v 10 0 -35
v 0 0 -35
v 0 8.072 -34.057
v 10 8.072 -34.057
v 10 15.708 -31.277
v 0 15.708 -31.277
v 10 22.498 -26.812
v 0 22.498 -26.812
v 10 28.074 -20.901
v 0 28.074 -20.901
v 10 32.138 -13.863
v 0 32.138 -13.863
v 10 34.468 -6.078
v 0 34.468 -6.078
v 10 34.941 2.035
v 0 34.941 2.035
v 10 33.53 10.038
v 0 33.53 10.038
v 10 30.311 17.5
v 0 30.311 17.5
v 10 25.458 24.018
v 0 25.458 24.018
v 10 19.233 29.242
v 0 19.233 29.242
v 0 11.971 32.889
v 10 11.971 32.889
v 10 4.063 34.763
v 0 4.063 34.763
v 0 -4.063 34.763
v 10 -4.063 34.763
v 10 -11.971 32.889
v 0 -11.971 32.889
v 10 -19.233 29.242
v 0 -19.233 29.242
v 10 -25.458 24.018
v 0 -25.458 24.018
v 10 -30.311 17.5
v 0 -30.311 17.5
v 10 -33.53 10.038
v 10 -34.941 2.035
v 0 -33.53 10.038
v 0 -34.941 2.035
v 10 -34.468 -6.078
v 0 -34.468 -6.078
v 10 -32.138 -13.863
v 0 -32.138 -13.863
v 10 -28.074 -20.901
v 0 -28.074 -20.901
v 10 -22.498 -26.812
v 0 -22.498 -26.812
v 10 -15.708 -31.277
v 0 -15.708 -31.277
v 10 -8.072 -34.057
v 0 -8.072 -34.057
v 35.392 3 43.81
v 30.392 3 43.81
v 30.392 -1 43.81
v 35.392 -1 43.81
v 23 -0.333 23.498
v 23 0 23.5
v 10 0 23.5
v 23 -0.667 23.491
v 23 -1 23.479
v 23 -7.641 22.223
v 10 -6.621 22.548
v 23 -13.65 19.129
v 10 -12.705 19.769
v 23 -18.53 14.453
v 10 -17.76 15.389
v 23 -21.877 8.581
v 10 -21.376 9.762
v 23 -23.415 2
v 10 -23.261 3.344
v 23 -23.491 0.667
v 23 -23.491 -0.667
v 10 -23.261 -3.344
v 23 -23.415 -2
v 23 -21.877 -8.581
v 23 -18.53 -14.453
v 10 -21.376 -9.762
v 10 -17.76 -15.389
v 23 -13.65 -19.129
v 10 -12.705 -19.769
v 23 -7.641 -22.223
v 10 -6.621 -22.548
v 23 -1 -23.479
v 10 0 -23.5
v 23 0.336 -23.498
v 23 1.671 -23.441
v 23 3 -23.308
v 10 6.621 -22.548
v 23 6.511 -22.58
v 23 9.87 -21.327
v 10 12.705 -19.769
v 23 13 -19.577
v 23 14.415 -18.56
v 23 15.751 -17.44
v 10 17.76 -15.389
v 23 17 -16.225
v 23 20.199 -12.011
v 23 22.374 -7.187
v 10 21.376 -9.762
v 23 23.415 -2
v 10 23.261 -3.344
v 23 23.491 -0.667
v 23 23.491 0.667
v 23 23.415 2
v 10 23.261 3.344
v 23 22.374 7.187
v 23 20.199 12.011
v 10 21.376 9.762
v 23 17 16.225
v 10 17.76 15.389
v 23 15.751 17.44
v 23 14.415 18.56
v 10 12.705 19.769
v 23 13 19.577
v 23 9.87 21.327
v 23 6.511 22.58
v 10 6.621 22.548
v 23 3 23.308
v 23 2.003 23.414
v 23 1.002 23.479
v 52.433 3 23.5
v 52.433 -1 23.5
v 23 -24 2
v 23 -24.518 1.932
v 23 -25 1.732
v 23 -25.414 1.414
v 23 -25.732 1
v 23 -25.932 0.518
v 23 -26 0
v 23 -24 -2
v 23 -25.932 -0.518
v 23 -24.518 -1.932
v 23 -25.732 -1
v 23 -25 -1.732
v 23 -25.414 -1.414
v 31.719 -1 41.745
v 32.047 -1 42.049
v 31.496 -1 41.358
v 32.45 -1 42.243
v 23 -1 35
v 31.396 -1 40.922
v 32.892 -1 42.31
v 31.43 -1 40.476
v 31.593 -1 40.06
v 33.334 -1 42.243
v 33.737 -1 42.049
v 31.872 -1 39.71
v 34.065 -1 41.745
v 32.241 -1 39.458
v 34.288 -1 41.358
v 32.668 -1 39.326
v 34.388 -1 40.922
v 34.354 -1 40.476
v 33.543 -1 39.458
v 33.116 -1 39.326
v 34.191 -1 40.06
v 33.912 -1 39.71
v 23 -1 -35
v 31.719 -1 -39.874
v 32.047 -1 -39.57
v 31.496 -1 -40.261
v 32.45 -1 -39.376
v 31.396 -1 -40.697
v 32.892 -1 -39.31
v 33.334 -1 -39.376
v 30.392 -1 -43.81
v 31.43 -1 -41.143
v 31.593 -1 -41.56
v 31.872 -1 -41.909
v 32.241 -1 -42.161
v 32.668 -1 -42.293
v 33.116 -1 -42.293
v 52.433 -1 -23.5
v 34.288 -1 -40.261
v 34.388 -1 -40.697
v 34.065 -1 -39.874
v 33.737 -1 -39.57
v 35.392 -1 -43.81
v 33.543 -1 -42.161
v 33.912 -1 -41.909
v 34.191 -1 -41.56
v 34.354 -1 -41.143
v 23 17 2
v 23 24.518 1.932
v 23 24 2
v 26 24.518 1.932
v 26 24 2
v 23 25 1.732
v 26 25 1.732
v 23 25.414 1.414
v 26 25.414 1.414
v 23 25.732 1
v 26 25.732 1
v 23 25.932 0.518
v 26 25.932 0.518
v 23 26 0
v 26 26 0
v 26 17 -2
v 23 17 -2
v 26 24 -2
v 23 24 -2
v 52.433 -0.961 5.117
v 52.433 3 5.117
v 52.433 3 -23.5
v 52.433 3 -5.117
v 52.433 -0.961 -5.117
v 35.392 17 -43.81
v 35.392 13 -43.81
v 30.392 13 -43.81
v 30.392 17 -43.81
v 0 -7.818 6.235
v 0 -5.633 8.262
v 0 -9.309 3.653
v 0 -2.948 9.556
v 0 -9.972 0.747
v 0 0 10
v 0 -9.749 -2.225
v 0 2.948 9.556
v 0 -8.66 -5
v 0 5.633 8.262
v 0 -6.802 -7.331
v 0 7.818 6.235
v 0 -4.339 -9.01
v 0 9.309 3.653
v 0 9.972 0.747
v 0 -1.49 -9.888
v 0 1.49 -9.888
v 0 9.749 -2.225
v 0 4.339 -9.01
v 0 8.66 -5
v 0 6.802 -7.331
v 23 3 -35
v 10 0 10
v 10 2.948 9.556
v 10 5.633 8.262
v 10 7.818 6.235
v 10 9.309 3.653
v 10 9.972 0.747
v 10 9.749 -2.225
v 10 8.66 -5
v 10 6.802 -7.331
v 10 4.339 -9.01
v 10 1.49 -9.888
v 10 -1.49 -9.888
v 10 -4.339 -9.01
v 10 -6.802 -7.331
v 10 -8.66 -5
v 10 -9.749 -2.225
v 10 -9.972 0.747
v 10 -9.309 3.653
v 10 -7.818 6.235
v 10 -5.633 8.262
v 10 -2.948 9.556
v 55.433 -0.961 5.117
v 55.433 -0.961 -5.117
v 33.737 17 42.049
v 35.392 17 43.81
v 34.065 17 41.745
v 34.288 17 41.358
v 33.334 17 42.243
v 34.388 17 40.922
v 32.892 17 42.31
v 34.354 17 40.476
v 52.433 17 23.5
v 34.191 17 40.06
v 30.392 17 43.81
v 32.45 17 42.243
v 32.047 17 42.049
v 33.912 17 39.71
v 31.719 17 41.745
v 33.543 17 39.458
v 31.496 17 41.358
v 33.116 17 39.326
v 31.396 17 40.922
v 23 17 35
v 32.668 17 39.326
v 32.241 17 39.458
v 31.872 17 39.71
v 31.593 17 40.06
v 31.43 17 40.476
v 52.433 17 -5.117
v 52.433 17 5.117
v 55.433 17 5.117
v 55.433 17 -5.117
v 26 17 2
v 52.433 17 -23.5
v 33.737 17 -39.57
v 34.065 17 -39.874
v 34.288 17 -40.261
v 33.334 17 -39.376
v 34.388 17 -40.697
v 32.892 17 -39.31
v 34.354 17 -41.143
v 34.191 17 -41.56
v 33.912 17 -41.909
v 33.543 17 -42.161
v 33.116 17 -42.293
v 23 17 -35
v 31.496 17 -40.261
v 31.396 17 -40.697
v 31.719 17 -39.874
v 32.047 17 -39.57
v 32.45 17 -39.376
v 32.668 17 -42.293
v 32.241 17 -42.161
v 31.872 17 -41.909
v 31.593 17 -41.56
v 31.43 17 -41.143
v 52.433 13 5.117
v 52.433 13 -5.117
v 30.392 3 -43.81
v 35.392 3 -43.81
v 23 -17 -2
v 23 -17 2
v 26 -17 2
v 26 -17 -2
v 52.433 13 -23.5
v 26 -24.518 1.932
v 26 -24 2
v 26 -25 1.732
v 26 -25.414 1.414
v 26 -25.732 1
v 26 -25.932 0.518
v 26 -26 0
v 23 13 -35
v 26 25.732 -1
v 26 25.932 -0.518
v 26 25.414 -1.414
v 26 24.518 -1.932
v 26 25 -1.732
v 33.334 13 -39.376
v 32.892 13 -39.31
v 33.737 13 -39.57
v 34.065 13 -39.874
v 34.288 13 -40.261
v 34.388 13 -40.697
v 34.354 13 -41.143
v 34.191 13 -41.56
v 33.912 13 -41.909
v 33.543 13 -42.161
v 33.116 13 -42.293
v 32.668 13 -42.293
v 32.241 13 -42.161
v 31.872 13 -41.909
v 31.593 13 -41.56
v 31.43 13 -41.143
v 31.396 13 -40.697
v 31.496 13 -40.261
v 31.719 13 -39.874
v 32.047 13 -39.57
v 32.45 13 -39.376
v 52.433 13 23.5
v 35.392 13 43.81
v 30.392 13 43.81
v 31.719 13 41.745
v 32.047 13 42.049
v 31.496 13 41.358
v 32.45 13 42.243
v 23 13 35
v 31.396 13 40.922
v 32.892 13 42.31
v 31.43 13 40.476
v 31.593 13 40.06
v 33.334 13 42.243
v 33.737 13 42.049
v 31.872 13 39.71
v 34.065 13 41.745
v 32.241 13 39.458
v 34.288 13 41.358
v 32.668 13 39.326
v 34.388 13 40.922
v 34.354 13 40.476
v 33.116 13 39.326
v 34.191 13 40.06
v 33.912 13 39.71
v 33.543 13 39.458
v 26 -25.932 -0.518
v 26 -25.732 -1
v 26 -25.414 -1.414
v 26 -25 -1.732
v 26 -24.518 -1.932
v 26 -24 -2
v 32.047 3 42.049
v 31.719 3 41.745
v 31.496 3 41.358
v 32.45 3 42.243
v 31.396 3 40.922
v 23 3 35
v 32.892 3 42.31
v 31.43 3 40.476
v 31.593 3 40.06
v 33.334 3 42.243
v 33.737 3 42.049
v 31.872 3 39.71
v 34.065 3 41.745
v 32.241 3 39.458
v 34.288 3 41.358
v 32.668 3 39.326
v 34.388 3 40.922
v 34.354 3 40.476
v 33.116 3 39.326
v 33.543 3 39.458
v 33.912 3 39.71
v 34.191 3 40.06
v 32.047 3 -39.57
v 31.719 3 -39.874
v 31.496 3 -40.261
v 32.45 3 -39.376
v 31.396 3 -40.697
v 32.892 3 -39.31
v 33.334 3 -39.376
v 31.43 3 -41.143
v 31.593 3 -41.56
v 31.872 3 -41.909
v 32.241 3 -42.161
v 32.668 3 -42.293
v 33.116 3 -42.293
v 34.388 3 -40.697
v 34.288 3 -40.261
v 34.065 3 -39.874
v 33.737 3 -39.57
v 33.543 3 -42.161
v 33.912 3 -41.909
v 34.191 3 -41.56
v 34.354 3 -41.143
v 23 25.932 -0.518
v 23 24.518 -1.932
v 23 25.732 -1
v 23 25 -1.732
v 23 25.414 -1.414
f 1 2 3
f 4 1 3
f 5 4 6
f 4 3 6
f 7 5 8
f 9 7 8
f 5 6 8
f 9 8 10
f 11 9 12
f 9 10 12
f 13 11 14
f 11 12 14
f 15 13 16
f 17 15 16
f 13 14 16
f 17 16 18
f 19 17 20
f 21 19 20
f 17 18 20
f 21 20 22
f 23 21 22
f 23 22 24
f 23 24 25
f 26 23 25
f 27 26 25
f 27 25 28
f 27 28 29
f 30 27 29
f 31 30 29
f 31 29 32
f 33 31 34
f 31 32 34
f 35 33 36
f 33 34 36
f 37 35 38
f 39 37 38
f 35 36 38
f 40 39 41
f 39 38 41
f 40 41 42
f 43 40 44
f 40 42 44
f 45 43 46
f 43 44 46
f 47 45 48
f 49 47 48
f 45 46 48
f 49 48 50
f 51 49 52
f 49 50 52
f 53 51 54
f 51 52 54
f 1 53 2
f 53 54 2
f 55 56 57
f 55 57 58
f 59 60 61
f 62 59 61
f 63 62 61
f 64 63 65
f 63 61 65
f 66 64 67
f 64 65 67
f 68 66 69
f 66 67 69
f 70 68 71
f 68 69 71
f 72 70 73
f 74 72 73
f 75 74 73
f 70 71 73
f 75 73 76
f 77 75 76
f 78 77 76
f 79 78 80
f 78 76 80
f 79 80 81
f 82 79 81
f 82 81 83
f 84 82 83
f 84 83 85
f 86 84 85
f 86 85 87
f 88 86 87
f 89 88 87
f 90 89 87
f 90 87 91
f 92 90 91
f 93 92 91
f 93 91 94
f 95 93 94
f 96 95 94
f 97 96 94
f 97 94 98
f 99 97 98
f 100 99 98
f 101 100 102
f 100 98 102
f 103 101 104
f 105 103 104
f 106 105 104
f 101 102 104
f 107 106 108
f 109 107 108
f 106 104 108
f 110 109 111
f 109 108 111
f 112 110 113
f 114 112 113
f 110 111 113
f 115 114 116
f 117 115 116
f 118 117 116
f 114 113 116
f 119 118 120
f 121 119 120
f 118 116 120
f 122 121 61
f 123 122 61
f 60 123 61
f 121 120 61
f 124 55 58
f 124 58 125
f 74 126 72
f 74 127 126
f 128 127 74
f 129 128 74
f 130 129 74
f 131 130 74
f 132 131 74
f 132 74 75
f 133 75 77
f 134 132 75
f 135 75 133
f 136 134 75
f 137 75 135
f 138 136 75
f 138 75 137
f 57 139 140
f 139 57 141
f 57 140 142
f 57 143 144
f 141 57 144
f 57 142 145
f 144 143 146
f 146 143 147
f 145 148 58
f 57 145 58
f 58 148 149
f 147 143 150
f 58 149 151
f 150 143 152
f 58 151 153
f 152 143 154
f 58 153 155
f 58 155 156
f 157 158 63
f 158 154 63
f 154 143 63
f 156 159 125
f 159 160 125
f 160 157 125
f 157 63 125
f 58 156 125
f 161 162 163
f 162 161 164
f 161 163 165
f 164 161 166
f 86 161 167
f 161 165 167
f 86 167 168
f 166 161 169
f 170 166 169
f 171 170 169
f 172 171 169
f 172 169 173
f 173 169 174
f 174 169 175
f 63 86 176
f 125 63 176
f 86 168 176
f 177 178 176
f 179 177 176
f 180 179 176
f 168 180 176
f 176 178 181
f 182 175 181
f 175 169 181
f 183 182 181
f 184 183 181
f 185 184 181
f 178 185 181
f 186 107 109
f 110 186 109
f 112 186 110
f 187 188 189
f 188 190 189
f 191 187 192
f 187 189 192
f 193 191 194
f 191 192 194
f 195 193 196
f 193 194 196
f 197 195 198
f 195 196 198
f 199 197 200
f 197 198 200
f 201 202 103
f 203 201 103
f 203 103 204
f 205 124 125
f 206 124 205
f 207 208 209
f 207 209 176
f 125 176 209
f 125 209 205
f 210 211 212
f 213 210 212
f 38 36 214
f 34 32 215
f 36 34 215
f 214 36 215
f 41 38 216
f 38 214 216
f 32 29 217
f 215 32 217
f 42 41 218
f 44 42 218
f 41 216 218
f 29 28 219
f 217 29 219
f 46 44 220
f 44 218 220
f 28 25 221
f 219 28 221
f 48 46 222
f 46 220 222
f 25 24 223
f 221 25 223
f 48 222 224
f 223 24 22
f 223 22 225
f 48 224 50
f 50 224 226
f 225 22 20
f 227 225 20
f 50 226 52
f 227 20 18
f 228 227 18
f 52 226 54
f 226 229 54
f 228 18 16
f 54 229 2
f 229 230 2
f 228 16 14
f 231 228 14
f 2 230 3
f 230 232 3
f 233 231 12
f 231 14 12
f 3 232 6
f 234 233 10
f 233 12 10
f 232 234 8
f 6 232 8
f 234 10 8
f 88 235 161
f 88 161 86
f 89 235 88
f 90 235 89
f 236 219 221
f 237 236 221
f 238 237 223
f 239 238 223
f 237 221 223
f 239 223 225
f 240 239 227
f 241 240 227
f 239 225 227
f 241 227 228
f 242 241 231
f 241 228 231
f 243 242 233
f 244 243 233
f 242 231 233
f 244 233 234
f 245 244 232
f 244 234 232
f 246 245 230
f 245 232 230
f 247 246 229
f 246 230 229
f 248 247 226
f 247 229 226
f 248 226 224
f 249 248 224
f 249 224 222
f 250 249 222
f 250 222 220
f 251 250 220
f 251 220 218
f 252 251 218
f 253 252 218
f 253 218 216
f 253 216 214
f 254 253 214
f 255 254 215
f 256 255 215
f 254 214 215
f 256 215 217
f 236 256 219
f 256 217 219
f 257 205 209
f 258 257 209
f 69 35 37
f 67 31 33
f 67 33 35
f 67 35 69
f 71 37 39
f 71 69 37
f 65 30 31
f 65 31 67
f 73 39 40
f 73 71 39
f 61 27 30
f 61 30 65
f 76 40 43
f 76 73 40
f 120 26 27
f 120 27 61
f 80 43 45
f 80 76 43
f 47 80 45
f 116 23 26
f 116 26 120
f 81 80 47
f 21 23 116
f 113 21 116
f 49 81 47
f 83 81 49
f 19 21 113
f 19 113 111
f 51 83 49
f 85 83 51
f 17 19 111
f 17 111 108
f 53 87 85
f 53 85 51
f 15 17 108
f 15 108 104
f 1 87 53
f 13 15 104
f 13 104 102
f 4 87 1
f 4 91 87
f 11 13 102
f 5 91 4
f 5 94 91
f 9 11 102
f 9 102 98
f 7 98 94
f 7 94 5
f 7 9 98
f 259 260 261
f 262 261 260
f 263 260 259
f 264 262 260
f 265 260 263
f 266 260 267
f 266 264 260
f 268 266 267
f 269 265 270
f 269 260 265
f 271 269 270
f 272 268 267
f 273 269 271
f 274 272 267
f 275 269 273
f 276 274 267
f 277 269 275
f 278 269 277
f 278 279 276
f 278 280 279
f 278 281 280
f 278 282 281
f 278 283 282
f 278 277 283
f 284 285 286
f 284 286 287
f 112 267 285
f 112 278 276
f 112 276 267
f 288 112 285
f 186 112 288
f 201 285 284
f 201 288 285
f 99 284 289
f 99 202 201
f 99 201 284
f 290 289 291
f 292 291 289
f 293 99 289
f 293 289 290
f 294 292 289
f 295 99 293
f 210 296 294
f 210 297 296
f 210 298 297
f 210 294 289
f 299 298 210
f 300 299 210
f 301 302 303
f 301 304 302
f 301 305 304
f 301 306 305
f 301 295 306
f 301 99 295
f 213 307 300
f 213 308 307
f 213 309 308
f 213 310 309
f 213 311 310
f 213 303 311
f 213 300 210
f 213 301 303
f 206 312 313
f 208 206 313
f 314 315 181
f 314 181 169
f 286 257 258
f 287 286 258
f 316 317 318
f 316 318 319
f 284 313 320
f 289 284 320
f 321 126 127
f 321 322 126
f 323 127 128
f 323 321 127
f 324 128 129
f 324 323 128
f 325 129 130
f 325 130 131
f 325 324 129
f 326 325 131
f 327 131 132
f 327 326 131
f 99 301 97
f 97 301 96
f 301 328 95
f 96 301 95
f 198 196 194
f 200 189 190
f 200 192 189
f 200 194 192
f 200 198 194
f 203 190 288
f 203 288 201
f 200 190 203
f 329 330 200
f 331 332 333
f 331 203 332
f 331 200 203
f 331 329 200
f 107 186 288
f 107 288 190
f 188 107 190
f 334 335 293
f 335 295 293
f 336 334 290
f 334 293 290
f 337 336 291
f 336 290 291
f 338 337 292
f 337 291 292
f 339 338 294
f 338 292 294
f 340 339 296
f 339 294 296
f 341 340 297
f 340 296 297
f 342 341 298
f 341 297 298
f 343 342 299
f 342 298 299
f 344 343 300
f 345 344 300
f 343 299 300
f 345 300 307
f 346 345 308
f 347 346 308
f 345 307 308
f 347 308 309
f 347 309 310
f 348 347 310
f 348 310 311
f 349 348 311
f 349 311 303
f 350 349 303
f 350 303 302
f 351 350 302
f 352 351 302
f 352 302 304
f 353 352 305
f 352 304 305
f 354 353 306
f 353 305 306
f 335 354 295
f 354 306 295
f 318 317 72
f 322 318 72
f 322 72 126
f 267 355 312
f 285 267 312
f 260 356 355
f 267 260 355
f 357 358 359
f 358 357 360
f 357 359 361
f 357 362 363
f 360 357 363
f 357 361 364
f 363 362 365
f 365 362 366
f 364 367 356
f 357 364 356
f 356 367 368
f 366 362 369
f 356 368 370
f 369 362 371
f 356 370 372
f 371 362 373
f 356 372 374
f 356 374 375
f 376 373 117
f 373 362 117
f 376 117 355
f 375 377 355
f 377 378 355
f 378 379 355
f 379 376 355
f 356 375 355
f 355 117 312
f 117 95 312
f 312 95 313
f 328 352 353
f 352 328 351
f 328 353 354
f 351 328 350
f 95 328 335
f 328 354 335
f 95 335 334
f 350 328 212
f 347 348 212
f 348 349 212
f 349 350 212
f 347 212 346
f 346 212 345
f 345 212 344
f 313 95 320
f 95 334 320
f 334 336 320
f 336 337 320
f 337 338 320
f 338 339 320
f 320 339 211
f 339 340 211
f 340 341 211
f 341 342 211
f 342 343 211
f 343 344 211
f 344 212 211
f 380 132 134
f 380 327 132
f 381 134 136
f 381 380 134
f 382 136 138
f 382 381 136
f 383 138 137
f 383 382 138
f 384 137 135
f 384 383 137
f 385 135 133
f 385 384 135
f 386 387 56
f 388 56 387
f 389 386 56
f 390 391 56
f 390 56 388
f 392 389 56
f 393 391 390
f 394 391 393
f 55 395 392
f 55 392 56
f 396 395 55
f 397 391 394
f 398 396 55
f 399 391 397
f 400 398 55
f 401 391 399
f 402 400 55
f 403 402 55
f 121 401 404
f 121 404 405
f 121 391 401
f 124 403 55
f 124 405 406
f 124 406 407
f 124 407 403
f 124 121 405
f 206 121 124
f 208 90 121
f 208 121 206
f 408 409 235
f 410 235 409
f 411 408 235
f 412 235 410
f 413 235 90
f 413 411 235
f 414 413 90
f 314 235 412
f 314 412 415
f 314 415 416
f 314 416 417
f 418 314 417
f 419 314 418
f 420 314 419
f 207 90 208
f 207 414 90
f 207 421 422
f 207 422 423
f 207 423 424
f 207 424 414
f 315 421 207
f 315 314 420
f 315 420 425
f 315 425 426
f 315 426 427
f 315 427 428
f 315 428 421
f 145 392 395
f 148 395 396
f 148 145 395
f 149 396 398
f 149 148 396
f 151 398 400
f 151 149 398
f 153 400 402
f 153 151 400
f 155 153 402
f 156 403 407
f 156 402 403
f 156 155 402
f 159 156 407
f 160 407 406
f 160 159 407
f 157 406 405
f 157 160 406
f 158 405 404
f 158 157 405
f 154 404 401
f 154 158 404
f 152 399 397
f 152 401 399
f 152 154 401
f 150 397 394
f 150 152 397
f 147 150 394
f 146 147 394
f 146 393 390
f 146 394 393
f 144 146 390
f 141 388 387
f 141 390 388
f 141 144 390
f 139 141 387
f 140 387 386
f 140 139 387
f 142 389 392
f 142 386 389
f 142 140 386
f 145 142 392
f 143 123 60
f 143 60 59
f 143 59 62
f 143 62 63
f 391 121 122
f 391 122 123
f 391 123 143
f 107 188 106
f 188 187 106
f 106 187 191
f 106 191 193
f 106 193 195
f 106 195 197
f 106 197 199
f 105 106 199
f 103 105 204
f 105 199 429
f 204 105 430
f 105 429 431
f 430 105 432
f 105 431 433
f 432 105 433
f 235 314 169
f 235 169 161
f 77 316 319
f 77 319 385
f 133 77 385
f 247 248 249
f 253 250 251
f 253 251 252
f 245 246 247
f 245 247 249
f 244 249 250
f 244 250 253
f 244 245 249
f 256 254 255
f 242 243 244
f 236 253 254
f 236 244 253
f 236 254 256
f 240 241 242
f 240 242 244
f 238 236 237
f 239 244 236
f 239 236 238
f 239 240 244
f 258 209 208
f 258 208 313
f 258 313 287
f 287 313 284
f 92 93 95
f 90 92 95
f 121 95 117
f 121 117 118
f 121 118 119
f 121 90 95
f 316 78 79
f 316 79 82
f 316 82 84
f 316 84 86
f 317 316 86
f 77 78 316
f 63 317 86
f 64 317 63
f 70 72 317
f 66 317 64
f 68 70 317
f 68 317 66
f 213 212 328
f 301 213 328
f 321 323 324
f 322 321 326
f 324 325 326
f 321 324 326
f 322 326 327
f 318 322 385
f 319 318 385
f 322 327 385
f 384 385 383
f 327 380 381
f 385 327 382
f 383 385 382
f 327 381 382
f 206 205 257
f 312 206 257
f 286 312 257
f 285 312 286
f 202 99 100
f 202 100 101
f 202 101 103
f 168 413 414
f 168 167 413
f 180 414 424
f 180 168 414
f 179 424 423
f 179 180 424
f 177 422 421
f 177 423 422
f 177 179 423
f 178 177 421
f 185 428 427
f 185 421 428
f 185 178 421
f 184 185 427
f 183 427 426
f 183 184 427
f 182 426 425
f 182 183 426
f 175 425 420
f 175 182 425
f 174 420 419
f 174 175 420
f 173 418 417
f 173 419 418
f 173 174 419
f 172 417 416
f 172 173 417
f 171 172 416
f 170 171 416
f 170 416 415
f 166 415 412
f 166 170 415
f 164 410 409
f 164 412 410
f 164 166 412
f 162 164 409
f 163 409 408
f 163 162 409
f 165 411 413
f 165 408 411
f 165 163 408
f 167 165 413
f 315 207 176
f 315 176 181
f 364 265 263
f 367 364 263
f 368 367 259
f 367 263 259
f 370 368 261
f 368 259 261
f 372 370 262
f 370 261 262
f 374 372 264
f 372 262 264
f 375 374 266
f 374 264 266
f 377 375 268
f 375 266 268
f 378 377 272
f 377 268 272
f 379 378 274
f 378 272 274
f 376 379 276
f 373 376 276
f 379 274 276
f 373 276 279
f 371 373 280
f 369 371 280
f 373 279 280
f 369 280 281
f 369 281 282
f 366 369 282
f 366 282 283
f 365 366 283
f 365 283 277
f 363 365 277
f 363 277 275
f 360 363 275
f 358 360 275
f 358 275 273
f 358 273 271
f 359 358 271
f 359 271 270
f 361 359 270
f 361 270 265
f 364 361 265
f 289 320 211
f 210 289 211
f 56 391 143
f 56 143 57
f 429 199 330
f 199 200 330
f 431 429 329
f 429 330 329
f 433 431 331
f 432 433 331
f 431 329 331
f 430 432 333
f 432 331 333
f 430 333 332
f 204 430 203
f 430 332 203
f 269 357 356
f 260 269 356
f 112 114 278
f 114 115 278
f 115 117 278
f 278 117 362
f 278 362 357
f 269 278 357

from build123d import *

# Parameters (mm, degrees)
SKETCH1_R            = 35
BOSS_EXTRUDE1_DEPTH  = 10
SKETCH2_R            = 23.5
BOSS_EXTRUDE2_DEPTH  = 13
BOSS_EXTRUDE4_DEPTH  = 4
SKETCH5_R            = 1.5
CUT_EXTRUDE1_DEPTH   = 86.86350209
SKETCH6_W            = 4
SKETCH6_H            = 9
BOSS_EXTRUDE5_DEPTH  = 3
FILLET1_R            = 2
FILLET1_OF_MIRROR2_R = 2
SKETCH8_R            = 10
CUT_EXTRUDE2_DEPTH   = 10
SKETCH11_W           = 10.23491337
SKETCH11_H           = 17.961461559
BOSS_EXTRUDE6_DEPTH  = 3


with BuildPart() as part:
    # Sketch1 → Boss-Extrude1 (new body)
    with BuildSketch(Plane(origin=(0, 0, 0), x_dir=(0, 0, -1), z_dir=(1, 0, 0))):
        Circle(SKETCH1_R)
    extrude(amount=BOSS_EXTRUDE1_DEPTH)

    # Sketch2 → Boss-Extrude2 (add)
    with BuildSketch(Plane(origin=(10, 0, 0), x_dir=(0, 0, -1), z_dir=(1, 0, 0))):
        with Locations(Location((0, 0, 0), (0, 0, 180))):
            Circle(SKETCH2_R)
    extrude(amount=BOSS_EXTRUDE2_DEPTH)

    # Sketch3 → Boss-Extrude4 (add)
    with BuildSketch(Plane(origin=(0, 13, 0), x_dir=(1, 0, 0), z_dir=(0, 1, 0))):
        Polygon((23, 35), (23, -35), (30.392057511, -43.809511096), (35.392057511, -43.809511096), (52.43346001, -23.500358445), (52.43346001, 23.500358445), (35.392057511, 43.809511096), (30.392057511, 43.809511096), align=None)
    boss_extrude4 = extrude(amount=BOSS_EXTRUDE4_DEPTH)

    # Sketch5 → Cut-Extrude1 (cut, symmetric)
    with BuildSketch(Plane(origin=(0, 17, 0), x_dir=(1, 0, 0), z_dir=(0, 1, 0))):
        with Locations(Location((32.892057511, -40.809511096, 0), (0, 0, 270))):
            Circle(SKETCH5_R)
        with Locations(Location((32.892057511, 40.809511096, 0), (0, 0, 270))):
            Circle(SKETCH5_R)
    cut_extrude1 = extrude(amount=CUT_EXTRUDE1_DEPTH, both=True, mode=Mode.SUBTRACT)

    # Sketch6 → Boss-Extrude5 (add)
    with BuildSketch(Plane(origin=(23, 0, 0), x_dir=(0, 0, -1), z_dir=(1, 0, 0))):
        with Locations((0, 21.5)):
            Rectangle(SKETCH6_W, SKETCH6_H)
    boss_extrude5 = extrude(amount=BOSS_EXTRUDE5_DEPTH)

    # Fillet1
    fillet1_edges = [part.edges().sort_by_distance(p)[0] for p in [
        (24.5, 26, -2),
        (24.5, 26, 2),
    ]]
    fillet(fillet1_edges, radius=FILLET1_R - 0.0001)  # a hair under: the kernel refuses the full size

    # Mirror2: Boss-Extrude5 across plane
    add(boss_extrude5.mirror(Plane.ZX))

    # Fillet1 of Mirror2
    fillet1_of_mirror2_edges = [part.edges().sort_by_distance(p)[0] for p in [
        (24.5, -26, -2),
        (24.5, -26, 2),
    ]]
    fillet(fillet1_of_mirror2_edges, radius=FILLET1_OF_MIRROR2_R - 0.0001)  # a hair under: the kernel refuses the full size

    # Sketch8 → Cut-Extrude2 (cut)
    with BuildSketch(Plane.ZY):
        Circle(SKETCH8_R)
    extrude(amount=-CUT_EXTRUDE2_DEPTH, mode=Mode.SUBTRACT)

    # Mirror3: Boss-Extrude4, Cut-Extrude1 across plane
    add(boss_extrude4.mirror(Plane(origin=(0, 8, 0), x_dir=(0, 0, 1), z_dir=(0, -1, 0))))
    add(cut_extrude1.mirror(Plane(origin=(0, 8, 0), x_dir=(0, 0, 1), z_dir=(0, -1, 0))), mode=Mode.SUBTRACT)

    # Sketch11 → Boss-Extrude6 (add)
    with BuildSketch(Plane(origin=(52.43346001, 0, 0), x_dir=(0, 0, -1), z_dir=(1, 0, 0))):
        with Locations((0, 8.019269221)):
            Rectangle(SKETCH11_W, SKETCH11_H)
    extrude(amount=BOSS_EXTRUDE6_DEPTH)


solid = part.part
